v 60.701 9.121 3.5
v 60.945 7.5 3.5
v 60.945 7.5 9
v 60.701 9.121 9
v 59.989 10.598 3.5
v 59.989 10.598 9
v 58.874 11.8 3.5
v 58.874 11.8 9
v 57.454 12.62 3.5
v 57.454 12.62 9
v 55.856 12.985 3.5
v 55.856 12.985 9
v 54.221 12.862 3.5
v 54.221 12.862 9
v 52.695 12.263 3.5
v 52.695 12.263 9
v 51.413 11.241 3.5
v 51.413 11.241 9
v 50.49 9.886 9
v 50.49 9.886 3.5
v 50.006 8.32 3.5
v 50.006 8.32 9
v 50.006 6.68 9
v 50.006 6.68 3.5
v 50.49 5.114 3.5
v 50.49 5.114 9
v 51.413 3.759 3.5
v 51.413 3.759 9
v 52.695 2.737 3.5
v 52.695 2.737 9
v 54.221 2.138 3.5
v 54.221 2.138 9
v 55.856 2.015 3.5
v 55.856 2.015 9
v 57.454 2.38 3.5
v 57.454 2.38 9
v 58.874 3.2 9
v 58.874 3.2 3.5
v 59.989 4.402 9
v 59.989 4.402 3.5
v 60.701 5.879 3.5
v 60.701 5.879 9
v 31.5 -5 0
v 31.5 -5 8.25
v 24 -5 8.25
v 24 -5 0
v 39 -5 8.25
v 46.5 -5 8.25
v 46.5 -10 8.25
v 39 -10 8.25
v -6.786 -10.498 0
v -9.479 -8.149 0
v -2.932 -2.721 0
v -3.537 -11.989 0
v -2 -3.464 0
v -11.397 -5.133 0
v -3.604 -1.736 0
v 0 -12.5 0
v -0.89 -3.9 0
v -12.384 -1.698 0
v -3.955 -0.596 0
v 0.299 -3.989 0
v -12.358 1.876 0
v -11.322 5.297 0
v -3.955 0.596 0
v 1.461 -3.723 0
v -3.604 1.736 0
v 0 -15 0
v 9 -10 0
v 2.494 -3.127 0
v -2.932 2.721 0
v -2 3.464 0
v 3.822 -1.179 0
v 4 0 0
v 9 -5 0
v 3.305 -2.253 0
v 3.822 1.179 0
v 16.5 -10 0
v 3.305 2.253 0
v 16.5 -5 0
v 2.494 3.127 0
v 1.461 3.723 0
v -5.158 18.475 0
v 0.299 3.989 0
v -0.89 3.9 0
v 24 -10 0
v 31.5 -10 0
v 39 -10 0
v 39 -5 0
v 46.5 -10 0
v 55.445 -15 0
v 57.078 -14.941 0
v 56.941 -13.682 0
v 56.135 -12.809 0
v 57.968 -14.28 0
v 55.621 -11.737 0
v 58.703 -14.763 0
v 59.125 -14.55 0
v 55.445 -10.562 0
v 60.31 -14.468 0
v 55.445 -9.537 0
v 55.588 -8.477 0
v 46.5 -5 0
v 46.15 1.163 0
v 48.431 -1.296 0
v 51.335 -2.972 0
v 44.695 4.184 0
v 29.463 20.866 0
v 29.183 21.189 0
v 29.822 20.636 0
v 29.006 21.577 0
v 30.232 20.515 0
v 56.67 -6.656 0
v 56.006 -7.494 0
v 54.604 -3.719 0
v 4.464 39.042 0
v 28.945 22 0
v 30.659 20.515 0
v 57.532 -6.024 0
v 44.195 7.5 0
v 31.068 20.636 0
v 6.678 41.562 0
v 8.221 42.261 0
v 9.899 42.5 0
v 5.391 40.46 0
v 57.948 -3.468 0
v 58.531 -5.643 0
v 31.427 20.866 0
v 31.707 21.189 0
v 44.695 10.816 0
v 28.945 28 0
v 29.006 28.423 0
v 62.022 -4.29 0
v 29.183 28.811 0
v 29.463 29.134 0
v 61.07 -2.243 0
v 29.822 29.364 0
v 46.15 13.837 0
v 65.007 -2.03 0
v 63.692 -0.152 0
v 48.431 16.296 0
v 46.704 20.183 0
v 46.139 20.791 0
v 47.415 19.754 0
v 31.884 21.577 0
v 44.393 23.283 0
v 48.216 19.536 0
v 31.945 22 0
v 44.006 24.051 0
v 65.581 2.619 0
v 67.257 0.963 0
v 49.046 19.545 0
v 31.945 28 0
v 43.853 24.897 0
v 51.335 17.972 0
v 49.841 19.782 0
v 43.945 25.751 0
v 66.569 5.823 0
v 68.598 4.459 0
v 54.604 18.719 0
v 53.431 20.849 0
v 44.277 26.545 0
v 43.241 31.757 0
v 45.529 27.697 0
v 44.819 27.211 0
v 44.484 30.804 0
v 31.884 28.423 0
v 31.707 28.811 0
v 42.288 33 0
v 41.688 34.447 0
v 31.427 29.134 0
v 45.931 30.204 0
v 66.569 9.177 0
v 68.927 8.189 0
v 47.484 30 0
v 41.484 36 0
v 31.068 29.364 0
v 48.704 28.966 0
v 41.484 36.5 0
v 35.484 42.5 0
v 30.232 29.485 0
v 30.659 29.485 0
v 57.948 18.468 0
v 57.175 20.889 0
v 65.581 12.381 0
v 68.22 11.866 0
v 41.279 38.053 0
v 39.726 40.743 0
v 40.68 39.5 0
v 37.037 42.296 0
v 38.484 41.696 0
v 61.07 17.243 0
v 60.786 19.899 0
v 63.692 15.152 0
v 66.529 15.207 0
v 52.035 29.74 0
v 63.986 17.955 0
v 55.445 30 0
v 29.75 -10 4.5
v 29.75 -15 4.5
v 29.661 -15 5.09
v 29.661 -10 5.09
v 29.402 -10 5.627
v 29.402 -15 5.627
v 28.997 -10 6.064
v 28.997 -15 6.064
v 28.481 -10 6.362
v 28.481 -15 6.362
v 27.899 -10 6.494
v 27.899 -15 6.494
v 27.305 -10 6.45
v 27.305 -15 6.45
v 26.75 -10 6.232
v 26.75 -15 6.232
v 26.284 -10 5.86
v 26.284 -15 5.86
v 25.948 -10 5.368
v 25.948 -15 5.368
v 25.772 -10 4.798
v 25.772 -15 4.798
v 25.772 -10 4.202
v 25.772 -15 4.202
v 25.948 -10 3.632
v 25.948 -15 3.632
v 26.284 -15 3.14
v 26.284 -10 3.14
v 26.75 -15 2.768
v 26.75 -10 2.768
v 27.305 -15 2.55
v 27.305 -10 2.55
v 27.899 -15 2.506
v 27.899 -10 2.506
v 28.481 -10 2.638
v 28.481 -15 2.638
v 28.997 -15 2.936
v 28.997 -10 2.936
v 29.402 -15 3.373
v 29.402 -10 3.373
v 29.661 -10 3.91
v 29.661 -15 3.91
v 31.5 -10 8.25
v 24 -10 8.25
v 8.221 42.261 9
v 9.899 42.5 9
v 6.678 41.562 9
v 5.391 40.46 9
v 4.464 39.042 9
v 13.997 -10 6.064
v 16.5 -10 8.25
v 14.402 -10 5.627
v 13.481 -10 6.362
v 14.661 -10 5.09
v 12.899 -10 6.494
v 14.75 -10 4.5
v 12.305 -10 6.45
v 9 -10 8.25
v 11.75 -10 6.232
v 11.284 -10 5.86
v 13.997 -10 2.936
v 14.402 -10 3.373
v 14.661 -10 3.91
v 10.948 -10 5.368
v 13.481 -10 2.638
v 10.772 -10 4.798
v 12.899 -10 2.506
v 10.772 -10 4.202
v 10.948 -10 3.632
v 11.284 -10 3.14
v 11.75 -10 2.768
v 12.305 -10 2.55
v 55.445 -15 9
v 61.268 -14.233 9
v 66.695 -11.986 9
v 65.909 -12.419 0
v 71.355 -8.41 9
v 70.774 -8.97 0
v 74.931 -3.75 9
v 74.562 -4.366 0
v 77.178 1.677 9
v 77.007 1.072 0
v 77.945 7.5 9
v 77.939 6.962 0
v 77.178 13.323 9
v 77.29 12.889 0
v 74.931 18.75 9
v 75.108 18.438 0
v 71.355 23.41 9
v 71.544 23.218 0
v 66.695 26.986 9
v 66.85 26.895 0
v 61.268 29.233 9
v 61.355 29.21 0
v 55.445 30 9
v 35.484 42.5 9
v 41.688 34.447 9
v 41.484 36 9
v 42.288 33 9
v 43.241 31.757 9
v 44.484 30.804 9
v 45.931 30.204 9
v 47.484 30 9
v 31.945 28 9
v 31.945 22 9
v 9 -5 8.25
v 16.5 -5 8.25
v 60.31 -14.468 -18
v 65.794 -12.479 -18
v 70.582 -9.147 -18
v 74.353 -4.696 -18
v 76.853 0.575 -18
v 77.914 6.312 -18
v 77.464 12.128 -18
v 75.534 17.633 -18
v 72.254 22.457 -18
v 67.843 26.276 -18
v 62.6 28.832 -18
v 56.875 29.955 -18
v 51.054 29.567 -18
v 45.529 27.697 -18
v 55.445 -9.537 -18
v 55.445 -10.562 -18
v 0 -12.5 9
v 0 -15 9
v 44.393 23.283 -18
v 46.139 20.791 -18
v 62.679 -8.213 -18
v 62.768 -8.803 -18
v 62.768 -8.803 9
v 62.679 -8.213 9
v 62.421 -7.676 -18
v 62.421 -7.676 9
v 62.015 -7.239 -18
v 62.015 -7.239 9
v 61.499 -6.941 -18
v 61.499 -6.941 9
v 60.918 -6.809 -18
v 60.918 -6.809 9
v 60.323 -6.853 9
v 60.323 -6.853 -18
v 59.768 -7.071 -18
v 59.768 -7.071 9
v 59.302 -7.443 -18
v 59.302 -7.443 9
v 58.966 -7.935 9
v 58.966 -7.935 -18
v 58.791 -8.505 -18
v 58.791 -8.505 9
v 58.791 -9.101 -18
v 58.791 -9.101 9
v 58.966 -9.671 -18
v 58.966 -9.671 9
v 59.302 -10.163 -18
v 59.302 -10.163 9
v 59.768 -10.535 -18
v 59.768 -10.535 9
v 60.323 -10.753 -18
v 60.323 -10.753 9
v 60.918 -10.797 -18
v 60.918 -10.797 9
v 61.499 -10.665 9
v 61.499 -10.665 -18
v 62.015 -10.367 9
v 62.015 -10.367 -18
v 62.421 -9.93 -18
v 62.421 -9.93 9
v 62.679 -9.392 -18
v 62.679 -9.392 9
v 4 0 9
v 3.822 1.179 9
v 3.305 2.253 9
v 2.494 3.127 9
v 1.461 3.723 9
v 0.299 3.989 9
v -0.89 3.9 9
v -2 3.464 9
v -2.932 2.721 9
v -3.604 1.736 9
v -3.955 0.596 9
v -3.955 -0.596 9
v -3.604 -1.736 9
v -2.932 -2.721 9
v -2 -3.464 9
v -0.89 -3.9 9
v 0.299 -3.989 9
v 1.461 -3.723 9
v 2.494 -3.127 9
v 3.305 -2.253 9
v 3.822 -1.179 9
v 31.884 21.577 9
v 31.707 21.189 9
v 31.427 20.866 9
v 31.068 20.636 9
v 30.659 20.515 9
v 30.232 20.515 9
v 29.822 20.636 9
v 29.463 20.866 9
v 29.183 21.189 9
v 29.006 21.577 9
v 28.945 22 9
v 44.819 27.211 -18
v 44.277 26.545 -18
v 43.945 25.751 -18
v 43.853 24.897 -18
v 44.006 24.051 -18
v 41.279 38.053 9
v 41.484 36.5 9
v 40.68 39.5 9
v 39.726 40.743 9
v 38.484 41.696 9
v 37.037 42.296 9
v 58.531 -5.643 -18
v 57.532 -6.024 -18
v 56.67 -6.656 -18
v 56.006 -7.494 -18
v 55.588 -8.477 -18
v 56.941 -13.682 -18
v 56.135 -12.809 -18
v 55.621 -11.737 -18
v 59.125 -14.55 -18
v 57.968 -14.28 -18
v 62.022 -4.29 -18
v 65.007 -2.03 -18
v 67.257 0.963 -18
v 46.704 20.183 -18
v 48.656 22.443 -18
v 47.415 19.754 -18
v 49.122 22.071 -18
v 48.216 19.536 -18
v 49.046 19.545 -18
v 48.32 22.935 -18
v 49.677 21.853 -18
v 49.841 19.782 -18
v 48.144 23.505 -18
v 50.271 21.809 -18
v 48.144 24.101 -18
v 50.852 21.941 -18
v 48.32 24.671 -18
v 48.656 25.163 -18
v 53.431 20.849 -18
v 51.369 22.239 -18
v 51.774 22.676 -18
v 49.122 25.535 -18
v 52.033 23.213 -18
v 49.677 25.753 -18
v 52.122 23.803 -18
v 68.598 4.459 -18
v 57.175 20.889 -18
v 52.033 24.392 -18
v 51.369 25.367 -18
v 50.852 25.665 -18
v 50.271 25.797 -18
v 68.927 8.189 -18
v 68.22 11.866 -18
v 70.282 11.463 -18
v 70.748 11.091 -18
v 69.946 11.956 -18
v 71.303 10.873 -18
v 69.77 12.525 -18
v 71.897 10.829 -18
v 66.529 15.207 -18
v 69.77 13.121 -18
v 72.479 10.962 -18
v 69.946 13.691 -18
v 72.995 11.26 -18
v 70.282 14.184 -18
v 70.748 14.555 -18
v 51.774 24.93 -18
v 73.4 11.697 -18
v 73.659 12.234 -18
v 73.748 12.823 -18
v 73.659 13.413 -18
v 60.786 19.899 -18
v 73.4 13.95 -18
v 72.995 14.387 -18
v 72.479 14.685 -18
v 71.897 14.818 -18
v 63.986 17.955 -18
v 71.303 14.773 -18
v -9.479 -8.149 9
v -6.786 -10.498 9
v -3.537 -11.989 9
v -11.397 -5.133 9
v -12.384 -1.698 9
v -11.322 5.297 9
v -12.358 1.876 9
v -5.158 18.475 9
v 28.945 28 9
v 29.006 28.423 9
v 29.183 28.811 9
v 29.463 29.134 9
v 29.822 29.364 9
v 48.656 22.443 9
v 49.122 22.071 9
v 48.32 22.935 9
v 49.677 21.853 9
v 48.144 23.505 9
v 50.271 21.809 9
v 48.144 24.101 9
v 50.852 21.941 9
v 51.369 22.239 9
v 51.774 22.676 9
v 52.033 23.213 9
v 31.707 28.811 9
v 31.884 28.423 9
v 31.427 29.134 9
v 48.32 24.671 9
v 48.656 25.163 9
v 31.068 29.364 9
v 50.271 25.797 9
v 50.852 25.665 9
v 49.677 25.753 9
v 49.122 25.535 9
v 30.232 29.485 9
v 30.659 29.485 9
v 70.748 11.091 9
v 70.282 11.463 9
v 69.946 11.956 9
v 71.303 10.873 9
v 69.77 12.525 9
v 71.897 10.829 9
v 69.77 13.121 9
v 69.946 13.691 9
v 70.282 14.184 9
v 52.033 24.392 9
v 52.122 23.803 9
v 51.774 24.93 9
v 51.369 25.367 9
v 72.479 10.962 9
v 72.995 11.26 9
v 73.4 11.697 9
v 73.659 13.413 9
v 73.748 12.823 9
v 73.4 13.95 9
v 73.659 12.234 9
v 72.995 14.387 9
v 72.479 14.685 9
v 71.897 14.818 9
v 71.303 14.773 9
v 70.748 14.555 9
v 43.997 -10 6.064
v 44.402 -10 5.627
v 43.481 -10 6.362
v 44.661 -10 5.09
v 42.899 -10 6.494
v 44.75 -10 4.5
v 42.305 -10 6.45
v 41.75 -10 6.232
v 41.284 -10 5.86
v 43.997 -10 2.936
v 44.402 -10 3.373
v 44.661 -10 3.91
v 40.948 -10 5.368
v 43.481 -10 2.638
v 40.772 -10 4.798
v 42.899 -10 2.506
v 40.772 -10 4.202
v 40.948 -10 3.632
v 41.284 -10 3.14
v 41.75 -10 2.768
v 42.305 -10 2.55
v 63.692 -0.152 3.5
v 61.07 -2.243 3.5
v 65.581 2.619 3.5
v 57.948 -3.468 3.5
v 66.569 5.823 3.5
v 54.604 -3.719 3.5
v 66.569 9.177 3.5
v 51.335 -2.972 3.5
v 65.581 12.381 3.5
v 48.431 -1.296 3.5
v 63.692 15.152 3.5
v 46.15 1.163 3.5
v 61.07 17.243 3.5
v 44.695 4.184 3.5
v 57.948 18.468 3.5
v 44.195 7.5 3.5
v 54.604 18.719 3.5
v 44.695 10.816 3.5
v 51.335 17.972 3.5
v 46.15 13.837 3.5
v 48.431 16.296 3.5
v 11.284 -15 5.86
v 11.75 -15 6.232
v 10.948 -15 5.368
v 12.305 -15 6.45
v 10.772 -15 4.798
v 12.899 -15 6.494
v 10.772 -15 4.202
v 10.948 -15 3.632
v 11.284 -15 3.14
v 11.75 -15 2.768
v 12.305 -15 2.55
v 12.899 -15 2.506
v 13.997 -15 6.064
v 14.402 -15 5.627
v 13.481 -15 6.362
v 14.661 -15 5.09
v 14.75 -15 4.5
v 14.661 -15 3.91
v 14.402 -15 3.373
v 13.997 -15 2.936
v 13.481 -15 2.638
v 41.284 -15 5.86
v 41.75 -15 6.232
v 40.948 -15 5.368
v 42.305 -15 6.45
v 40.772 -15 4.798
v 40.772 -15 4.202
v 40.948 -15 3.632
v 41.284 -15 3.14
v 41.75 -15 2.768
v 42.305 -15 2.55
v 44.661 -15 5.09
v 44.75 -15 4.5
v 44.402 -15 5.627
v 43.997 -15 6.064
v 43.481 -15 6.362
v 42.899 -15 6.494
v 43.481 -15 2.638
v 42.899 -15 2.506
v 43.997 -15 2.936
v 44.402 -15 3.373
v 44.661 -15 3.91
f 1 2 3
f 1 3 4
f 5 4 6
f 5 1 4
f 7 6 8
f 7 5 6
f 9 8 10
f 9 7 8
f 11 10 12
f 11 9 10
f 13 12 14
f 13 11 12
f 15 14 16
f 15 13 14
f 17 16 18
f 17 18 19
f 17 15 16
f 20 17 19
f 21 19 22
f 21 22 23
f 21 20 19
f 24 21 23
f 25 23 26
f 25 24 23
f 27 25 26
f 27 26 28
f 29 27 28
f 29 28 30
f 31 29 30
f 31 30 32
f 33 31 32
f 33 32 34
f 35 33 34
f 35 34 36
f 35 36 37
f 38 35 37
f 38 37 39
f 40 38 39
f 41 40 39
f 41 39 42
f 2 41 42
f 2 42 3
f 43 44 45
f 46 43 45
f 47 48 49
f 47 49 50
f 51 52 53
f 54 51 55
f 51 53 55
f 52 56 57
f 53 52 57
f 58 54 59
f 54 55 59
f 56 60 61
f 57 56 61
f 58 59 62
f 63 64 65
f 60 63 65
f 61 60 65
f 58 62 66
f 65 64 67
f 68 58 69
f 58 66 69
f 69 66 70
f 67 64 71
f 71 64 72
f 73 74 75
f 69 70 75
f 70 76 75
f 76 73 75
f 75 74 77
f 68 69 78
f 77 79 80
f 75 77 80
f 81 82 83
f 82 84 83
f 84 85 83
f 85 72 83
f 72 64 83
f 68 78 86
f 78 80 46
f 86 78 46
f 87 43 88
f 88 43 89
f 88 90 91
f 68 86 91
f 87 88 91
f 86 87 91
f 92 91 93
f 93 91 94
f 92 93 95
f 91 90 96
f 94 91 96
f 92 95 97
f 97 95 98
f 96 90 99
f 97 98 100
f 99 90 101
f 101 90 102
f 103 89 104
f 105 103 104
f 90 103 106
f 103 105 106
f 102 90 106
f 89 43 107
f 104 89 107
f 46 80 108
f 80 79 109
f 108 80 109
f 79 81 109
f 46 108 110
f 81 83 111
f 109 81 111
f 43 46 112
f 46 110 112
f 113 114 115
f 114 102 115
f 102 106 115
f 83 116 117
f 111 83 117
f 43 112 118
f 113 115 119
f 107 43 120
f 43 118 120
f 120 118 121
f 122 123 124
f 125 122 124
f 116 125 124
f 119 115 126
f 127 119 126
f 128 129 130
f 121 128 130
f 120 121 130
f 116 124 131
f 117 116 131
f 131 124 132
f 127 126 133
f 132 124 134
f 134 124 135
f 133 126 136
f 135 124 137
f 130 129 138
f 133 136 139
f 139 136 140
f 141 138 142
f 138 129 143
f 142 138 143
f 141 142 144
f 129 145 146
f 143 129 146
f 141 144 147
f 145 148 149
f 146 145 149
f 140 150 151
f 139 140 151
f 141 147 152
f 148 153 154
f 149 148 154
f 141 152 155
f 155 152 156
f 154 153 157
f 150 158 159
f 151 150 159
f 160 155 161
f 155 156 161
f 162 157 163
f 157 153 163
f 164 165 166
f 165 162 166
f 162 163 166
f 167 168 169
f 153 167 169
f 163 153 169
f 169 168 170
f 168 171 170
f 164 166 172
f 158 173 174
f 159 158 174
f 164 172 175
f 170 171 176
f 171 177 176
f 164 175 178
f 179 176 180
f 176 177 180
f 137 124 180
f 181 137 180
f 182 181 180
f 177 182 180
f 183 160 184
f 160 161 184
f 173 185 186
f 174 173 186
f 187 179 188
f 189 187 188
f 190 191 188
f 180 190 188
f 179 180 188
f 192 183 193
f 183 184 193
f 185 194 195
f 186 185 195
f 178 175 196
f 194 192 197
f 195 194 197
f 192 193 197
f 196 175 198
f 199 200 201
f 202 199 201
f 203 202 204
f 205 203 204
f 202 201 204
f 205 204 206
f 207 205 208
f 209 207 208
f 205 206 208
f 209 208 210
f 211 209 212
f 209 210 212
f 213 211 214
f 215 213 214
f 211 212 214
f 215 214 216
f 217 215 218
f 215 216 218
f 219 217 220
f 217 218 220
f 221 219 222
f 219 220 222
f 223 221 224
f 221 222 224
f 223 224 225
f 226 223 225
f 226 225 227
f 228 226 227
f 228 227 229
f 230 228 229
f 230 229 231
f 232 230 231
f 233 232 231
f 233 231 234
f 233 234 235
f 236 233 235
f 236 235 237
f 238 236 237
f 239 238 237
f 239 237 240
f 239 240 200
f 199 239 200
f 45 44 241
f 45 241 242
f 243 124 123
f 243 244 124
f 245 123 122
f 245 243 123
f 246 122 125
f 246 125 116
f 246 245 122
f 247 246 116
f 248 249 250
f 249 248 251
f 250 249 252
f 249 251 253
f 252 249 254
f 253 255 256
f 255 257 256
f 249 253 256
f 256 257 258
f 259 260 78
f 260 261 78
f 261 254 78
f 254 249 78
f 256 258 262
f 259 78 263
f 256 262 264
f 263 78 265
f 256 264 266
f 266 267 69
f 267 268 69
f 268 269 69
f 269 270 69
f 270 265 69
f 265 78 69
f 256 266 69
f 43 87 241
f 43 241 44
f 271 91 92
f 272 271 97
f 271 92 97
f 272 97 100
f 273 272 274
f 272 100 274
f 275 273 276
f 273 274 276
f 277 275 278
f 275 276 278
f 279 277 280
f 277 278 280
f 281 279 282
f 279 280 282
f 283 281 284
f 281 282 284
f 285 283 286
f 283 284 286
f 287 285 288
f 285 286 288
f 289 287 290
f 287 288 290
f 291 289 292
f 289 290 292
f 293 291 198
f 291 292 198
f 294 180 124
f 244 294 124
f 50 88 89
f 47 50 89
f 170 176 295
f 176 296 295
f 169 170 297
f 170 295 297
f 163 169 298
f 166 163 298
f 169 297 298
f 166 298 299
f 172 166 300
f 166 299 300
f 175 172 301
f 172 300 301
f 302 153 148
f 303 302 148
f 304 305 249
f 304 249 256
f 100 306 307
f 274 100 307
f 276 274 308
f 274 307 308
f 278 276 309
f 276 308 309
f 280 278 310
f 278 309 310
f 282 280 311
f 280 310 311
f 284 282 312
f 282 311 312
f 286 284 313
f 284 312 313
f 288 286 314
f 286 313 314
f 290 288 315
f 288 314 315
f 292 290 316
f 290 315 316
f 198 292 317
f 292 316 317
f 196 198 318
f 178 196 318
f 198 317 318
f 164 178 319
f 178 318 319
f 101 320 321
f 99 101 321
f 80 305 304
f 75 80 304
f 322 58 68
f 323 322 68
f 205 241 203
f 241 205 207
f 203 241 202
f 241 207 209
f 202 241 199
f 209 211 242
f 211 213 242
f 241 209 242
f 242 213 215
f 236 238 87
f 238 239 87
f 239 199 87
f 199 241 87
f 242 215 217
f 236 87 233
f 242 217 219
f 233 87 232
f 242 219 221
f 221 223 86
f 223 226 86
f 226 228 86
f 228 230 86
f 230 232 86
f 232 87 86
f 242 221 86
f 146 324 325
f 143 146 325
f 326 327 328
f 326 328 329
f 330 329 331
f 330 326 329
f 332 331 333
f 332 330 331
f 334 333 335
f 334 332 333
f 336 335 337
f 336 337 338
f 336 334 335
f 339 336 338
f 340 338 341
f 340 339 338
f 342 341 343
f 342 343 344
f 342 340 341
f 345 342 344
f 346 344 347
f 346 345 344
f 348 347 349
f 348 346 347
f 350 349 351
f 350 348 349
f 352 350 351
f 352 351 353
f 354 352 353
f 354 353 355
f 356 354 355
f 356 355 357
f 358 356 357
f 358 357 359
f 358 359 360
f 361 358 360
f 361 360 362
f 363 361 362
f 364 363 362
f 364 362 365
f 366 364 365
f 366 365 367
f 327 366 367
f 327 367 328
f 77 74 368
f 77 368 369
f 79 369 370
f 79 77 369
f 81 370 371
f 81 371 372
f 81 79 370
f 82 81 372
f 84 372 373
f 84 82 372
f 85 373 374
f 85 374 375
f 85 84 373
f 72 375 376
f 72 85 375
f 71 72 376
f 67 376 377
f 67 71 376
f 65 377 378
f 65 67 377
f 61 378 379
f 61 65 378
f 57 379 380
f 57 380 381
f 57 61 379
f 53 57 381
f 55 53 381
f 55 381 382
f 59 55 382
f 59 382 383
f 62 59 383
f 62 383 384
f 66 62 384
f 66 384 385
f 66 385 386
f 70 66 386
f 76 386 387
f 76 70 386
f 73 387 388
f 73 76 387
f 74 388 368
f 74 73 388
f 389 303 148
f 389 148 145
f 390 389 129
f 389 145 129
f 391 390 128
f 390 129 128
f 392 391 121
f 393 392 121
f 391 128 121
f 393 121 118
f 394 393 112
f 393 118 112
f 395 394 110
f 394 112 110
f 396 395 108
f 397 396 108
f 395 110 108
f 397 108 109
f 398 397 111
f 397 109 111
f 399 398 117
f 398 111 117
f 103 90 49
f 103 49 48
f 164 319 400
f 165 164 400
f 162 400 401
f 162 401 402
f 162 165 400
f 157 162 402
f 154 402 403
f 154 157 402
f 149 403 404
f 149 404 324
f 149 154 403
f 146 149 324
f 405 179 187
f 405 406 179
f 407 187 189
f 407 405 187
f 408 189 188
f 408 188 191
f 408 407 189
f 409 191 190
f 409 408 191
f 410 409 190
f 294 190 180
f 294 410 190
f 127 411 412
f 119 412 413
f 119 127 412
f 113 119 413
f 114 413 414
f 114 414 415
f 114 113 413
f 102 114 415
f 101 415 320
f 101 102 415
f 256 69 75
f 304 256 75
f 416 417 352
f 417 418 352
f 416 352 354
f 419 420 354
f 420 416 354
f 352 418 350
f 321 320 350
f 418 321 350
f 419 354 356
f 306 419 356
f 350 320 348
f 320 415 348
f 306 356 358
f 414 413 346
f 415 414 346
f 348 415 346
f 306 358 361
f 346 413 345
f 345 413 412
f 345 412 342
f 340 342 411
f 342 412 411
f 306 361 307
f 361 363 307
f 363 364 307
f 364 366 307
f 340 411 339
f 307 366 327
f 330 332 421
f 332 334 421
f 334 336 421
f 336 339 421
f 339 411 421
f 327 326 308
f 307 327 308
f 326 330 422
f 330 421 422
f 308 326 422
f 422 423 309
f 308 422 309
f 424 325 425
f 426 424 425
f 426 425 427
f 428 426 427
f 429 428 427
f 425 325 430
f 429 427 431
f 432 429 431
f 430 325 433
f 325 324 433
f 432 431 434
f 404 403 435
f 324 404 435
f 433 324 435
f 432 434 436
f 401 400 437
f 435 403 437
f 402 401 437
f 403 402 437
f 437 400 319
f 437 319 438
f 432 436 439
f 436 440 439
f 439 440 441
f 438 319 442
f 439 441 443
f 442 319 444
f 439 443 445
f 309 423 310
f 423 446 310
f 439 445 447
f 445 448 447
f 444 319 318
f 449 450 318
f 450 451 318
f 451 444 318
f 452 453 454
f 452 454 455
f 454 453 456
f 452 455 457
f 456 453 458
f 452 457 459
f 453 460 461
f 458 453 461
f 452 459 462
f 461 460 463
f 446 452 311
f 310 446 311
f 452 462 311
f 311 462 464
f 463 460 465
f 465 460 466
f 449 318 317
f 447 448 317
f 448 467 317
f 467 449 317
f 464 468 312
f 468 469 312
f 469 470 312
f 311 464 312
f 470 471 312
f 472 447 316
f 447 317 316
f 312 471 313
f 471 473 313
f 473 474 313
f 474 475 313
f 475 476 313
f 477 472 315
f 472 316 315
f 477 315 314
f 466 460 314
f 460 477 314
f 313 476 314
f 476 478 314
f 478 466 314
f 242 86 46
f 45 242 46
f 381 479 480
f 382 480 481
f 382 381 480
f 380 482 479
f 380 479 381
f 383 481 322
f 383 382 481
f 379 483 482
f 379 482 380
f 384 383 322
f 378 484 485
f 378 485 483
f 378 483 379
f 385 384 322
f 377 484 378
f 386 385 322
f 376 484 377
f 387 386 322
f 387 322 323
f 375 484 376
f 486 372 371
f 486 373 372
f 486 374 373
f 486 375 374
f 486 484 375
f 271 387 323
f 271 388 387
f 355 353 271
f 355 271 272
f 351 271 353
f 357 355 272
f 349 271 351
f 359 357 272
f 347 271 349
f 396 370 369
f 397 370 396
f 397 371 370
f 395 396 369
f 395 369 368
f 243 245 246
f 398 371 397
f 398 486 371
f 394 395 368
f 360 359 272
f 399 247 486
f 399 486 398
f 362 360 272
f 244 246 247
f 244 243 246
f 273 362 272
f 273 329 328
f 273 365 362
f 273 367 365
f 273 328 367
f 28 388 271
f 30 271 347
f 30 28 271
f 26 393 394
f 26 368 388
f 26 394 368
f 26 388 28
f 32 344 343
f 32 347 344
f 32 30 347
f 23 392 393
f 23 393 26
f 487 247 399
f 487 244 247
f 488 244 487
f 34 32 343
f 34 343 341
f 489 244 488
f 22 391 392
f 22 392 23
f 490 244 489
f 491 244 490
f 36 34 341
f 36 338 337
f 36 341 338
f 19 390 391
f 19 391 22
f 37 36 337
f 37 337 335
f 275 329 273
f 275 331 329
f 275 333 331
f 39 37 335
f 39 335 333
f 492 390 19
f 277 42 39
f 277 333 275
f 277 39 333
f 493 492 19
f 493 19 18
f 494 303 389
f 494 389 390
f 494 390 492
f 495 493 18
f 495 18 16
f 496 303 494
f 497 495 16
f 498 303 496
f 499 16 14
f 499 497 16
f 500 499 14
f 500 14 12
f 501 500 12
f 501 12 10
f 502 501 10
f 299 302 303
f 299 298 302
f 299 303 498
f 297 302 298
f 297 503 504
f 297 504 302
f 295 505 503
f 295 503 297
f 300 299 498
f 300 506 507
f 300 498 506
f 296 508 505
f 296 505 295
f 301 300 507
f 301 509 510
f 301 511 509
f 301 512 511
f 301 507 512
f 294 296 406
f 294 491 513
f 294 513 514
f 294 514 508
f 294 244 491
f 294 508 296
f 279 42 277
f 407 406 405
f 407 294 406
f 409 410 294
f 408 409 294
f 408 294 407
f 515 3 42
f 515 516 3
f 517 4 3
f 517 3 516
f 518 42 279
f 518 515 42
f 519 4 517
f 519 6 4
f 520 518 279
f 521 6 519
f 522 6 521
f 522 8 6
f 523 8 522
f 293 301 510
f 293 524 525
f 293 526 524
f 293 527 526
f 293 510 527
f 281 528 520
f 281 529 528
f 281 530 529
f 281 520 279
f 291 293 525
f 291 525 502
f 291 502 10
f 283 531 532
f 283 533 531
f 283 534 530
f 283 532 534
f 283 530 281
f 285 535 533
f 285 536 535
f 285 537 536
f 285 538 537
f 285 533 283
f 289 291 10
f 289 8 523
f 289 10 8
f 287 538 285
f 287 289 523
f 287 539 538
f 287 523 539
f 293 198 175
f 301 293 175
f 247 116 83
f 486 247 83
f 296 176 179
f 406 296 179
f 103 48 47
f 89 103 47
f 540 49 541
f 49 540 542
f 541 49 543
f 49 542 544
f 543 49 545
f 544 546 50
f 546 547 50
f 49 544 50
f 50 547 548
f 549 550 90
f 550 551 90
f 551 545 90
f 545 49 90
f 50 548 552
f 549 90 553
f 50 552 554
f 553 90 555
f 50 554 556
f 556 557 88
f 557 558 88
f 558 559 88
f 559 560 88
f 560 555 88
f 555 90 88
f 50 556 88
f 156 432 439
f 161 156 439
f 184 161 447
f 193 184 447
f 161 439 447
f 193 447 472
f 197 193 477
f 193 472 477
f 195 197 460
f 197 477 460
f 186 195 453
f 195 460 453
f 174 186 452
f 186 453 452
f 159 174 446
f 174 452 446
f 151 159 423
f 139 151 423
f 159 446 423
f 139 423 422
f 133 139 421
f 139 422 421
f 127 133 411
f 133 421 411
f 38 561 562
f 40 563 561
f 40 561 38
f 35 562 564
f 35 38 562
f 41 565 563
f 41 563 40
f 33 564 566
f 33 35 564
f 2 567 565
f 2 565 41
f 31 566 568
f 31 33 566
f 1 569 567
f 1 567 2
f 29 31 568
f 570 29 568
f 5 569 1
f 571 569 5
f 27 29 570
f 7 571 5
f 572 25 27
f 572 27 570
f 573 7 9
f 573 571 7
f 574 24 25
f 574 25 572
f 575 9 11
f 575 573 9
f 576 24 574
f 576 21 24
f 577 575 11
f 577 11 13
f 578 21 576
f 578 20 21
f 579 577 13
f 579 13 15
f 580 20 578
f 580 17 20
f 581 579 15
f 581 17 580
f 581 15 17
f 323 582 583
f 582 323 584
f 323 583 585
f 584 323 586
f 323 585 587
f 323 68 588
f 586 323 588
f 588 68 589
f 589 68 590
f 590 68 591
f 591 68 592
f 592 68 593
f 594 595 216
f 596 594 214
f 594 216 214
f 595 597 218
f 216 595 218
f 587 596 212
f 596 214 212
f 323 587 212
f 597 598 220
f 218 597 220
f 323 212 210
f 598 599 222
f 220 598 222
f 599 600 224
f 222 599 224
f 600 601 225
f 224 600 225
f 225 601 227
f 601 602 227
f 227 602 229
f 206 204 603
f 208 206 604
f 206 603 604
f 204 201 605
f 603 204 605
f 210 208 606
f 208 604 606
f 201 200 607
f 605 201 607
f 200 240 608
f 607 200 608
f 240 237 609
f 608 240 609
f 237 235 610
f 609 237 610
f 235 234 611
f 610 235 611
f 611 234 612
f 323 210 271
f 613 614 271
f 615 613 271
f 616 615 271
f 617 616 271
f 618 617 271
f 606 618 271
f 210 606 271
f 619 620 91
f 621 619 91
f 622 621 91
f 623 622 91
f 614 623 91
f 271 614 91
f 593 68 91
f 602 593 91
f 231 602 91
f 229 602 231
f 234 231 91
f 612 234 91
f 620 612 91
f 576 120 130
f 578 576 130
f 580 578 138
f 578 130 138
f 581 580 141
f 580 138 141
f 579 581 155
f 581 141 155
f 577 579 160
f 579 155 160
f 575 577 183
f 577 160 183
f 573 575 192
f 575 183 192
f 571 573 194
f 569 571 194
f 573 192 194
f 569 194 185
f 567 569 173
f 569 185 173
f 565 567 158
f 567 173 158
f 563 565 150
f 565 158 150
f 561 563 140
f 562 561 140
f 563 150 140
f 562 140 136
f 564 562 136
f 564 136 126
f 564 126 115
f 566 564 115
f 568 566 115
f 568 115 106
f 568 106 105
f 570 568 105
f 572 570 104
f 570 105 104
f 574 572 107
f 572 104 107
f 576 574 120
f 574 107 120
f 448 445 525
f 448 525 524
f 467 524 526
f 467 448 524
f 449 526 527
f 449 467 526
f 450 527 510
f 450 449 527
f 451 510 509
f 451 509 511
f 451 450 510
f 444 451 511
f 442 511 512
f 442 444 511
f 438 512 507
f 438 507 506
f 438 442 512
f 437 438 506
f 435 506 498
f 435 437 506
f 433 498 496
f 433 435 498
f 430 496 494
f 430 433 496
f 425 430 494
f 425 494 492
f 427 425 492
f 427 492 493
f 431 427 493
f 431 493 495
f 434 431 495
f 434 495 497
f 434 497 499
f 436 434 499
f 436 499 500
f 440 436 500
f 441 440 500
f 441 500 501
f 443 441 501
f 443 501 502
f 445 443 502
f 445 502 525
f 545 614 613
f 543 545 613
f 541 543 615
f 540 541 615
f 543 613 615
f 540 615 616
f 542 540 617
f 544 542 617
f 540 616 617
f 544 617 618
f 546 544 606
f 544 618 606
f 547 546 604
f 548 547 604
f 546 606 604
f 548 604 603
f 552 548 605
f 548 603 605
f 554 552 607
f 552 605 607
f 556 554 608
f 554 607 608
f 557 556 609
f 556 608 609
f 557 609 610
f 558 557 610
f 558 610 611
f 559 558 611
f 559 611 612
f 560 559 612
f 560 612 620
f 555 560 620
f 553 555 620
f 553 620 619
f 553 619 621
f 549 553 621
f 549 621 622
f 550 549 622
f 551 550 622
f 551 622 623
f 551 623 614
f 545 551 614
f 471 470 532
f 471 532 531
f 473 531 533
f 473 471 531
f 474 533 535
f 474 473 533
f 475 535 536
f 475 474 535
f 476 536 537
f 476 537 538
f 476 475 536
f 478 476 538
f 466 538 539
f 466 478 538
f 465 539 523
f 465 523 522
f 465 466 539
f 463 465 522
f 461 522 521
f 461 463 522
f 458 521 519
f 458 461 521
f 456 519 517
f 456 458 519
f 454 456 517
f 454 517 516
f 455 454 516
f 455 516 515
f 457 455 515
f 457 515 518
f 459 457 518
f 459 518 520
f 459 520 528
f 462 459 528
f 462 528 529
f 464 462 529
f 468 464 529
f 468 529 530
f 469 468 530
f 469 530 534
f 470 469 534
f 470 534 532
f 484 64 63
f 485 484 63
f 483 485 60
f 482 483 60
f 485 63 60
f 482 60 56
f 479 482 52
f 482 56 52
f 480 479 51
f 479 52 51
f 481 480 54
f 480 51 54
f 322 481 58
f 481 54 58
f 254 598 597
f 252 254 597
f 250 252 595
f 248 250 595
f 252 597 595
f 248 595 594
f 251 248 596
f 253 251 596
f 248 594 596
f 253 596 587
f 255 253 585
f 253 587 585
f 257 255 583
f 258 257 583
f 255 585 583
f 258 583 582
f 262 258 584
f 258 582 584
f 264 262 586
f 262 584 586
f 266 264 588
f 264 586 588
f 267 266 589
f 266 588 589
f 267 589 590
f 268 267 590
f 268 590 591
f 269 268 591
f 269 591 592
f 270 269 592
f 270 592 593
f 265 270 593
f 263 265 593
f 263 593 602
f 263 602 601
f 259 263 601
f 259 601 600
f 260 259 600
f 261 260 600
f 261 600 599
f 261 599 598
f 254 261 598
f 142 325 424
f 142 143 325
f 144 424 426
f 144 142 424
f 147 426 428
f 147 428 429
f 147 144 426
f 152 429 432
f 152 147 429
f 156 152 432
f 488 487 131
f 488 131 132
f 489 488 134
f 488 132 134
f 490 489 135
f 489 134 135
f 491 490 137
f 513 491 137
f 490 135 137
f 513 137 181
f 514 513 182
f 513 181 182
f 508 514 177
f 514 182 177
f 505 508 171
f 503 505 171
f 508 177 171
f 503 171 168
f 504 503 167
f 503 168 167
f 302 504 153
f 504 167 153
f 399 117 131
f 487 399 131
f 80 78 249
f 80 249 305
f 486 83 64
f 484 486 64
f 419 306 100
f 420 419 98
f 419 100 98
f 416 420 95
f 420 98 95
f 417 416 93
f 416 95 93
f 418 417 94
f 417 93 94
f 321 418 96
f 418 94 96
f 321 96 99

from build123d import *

# Parameters (mm, degrees)
SKETCH1_R               = 2
SKETCH1_R_2             = 5.5
SKETCH1_R_3             = 4
BOSS_EXTRUDE1_DEPTH     = 9
BOSS_EXTRUDE2_START     = -27
BOSS_EXTRUDE2_OUTLINE_R = 2
BOSS_EXTRUDE2_DEPTH     = 18
FILLET1_R               = 4
FILLET2_R               = 3
SKETCH3_R               = 11.25
CUT_EXTRUDE1_DEPTH      = 3.5
BOSS_EXTRUDE3_START     = -9
BOSS_EXTRUDE3_DEPTH     = 9
CUT_EXTRUDE2_DEPTH      = 93.793746104
CUT_EXTRUDE2_DEPTH_BACK = 93.793746104
SKETCH7_W               = 7.5
SKETCH7_H               = 5
CUT_EXTRUDE3_DEPTH      = 8.25
SKETCH8_R               = 2
CUT_EXTRUDE5_DEPTH      = 8.25
FILLET4_R               = 6


# Read off the part's stored shape, not the designer's step: Boss-Extrude2
with BuildPart() as part:
    # Sketch1 → Boss-Extrude1 (new body)
    with BuildSketch(Plane.XY):
        with BuildLine():
            Line((0, -15), (55.445040355, -15))
            ThreePointArc((55.445040355, -15), (77.945040355, 7.5), (55.445040355, 30))
            Line((55.445040355, 30), (12.958080577, 30))
            ThreePointArc((12.958080577, 30), (2.222427952, 26.874411477), (-5.157701411, 18.474576271))
            Line((-5.157701411, 18.474576271), (-11.322363742, 5.296610169))
            ThreePointArc((-11.322363742, 5.296610169), (-10.546507173, -6.709782891), (0, -12.5))
            Line((0, -12.5), (0, -15))
        make_face()
        with Locations((50.121730514, 23.802909935)):
            Circle(SKETCH1_R, mode=Mode.SUBTRACT)
        with Locations((60.768350196, -8.802909935)):
            Circle(SKETCH1_R, mode=Mode.SUBTRACT)
        with Locations((55.445040355, 7.5)):
            Circle(SKETCH1_R_2, mode=Mode.SUBTRACT)
        with Locations((71.74795029, 12.823309841)):
            Circle(SKETCH1_R, mode=Mode.SUBTRACT)
        Circle(SKETCH1_R_3, mode=Mode.SUBTRACT)
    extrude(amount=BOSS_EXTRUDE1_DEPTH)

    # Boss-Extrude2 outline → Boss-Extrude2 (add)
    with BuildSketch(Plane.XY.offset(9).offset(BOSS_EXTRUDE2_START)):
        with BuildLine():
            ThreePointArc((55.445040355, -15), (76.903671747, 14.265880489), (42.539570537, 25.930920997))
            Line((42.539570537, 25.930920997), (47.701758465, 18.558552598))
            ThreePointArc((47.701758465, 18.558552598), (68.32021919, 11.559528293), (55.445040355, -6))
            Line((55.445040355, -6), (55.445040355, -15))
        make_face()
        with Locations((60.768350196, -8.802909935)):
            Circle(BOSS_EXTRUDE2_OUTLINE_R, mode=Mode.SUBTRACT)
        with Locations((50.121730514, 23.802909935)):
            Circle(BOSS_EXTRUDE2_OUTLINE_R, mode=Mode.SUBTRACT)
        with Locations((71.74795029, 12.823309841)):
            Circle(BOSS_EXTRUDE2_OUTLINE_R, mode=Mode.SUBTRACT)
    extrude(amount=BOSS_EXTRUDE2_DEPTH)

    # Fillet1
    fillet1_edges = [part.edges().sort_by_distance(p)[0] for p in [
        (55.445040355, -6, -9),
        (55.445040355, -15, -9),
    ]]
    fillet(fillet1_edges, radius=FILLET1_R)

    # Fillet2
    fillet2_edges = [part.edges().sort_by_distance(p)[0] for p in [
        (47.701758465, 18.558552598, -9),
        (42.539570537, 25.930920997, -9),
    ]]
    fillet(fillet2_edges, radius=FILLET2_R)

    # Sketch3 → Cut-Extrude1 (cut)
    with BuildSketch(Plane(origin=(0, 0, 0), x_dir=(-1, 0, 0), z_dir=(0, 0, -1))):
        with Locations((-55.445040355, 7.5)):
            Circle(SKETCH3_R)
    extrude(amount=-CUT_EXTRUDE1_DEPTH, mode=Mode.SUBTRACT)

    # Sketch5 → Boss-Extrude3 (add)
    with BuildSketch(Plane.XY.offset(9).offset(BOSS_EXTRUDE3_START)):
        with BuildLine():
            Line((41.483809243, 30), (41.483809243, 42.5))
            Line((41.483809243, 42.5), (12.958080577, 42.5))
            Line((12.958080577, 42.5), (6.081409657, 42.5))
            Line((6.081409657, 42.5), (-5.157701411, 18.474576271))
            ThreePointArc((-5.157701411, 18.474576271), (2.222427952, 26.874411477), (12.958080577, 30))
            Line((12.958080577, 30), (41.483809243, 30))
        make_face()
    extrude(amount=BOSS_EXTRUDE3_DEPTH)

    # Sketch6 → Cut-Extrude2 (cut, two sides: drawn at the far end of the back side and taken through both)
    with BuildSketch(Plane.XY.offset(9).offset(-CUT_EXTRUDE2_DEPTH_BACK)):
        with BuildLine():
            Line((31.945040355, 28), (31.945040355, 22))
            ThreePointArc((31.945040355, 22), (30.445040355, 20.5), (28.945040355, 22))
            Line((28.945040355, 22), (28.945040355, 28))
            ThreePointArc((28.945040355, 28), (30.445040355, 29.5), (31.945040355, 28))
        make_face()
    extrude(amount=CUT_EXTRUDE2_DEPTH + CUT_EXTRUDE2_DEPTH_BACK, mode=Mode.SUBTRACT)

    # Sketch7 → Cut-Extrude3 (cut)
    with BuildSketch(Plane(origin=(0, 0, 0), x_dir=(-1, 0, 0), z_dir=(0, 0, -1))):
        with Locations((-27.75, -7.5)):
            Rectangle(SKETCH7_W, SKETCH7_H)
        with Locations((-12.75, -7.5)):
            Rectangle(SKETCH7_W, SKETCH7_H)
        with Locations((-42.75, -7.5)):
            Rectangle(SKETCH7_W, SKETCH7_H)
    extrude(amount=-CUT_EXTRUDE3_DEPTH, mode=Mode.SUBTRACT)

    # Sketch8 → Cut-Extrude5 (cut)
    with BuildSketch(Plane.XZ.offset(15)):
        with Locations((42.75, 4.5)):
            Circle(SKETCH8_R)
        with Locations((27.75, 4.5)):
            Circle(SKETCH8_R)
        with Locations((12.75, 4.5)):
            Circle(SKETCH8_R)
    extrude(amount=-CUT_EXTRUDE5_DEPTH, mode=Mode.SUBTRACT)

    # Fillet4
    fillet4_edges = [part.edges().sort_by_distance(p)[0] for p in [
        (41.483809243, 30, 4.5),
        (41.483809243, 42.5, 4.5),
        (6.081409657, 42.5, 4.5),
    ]]
    fillet(fillet4_edges, radius=FILLET4_R)


solid = part.part
